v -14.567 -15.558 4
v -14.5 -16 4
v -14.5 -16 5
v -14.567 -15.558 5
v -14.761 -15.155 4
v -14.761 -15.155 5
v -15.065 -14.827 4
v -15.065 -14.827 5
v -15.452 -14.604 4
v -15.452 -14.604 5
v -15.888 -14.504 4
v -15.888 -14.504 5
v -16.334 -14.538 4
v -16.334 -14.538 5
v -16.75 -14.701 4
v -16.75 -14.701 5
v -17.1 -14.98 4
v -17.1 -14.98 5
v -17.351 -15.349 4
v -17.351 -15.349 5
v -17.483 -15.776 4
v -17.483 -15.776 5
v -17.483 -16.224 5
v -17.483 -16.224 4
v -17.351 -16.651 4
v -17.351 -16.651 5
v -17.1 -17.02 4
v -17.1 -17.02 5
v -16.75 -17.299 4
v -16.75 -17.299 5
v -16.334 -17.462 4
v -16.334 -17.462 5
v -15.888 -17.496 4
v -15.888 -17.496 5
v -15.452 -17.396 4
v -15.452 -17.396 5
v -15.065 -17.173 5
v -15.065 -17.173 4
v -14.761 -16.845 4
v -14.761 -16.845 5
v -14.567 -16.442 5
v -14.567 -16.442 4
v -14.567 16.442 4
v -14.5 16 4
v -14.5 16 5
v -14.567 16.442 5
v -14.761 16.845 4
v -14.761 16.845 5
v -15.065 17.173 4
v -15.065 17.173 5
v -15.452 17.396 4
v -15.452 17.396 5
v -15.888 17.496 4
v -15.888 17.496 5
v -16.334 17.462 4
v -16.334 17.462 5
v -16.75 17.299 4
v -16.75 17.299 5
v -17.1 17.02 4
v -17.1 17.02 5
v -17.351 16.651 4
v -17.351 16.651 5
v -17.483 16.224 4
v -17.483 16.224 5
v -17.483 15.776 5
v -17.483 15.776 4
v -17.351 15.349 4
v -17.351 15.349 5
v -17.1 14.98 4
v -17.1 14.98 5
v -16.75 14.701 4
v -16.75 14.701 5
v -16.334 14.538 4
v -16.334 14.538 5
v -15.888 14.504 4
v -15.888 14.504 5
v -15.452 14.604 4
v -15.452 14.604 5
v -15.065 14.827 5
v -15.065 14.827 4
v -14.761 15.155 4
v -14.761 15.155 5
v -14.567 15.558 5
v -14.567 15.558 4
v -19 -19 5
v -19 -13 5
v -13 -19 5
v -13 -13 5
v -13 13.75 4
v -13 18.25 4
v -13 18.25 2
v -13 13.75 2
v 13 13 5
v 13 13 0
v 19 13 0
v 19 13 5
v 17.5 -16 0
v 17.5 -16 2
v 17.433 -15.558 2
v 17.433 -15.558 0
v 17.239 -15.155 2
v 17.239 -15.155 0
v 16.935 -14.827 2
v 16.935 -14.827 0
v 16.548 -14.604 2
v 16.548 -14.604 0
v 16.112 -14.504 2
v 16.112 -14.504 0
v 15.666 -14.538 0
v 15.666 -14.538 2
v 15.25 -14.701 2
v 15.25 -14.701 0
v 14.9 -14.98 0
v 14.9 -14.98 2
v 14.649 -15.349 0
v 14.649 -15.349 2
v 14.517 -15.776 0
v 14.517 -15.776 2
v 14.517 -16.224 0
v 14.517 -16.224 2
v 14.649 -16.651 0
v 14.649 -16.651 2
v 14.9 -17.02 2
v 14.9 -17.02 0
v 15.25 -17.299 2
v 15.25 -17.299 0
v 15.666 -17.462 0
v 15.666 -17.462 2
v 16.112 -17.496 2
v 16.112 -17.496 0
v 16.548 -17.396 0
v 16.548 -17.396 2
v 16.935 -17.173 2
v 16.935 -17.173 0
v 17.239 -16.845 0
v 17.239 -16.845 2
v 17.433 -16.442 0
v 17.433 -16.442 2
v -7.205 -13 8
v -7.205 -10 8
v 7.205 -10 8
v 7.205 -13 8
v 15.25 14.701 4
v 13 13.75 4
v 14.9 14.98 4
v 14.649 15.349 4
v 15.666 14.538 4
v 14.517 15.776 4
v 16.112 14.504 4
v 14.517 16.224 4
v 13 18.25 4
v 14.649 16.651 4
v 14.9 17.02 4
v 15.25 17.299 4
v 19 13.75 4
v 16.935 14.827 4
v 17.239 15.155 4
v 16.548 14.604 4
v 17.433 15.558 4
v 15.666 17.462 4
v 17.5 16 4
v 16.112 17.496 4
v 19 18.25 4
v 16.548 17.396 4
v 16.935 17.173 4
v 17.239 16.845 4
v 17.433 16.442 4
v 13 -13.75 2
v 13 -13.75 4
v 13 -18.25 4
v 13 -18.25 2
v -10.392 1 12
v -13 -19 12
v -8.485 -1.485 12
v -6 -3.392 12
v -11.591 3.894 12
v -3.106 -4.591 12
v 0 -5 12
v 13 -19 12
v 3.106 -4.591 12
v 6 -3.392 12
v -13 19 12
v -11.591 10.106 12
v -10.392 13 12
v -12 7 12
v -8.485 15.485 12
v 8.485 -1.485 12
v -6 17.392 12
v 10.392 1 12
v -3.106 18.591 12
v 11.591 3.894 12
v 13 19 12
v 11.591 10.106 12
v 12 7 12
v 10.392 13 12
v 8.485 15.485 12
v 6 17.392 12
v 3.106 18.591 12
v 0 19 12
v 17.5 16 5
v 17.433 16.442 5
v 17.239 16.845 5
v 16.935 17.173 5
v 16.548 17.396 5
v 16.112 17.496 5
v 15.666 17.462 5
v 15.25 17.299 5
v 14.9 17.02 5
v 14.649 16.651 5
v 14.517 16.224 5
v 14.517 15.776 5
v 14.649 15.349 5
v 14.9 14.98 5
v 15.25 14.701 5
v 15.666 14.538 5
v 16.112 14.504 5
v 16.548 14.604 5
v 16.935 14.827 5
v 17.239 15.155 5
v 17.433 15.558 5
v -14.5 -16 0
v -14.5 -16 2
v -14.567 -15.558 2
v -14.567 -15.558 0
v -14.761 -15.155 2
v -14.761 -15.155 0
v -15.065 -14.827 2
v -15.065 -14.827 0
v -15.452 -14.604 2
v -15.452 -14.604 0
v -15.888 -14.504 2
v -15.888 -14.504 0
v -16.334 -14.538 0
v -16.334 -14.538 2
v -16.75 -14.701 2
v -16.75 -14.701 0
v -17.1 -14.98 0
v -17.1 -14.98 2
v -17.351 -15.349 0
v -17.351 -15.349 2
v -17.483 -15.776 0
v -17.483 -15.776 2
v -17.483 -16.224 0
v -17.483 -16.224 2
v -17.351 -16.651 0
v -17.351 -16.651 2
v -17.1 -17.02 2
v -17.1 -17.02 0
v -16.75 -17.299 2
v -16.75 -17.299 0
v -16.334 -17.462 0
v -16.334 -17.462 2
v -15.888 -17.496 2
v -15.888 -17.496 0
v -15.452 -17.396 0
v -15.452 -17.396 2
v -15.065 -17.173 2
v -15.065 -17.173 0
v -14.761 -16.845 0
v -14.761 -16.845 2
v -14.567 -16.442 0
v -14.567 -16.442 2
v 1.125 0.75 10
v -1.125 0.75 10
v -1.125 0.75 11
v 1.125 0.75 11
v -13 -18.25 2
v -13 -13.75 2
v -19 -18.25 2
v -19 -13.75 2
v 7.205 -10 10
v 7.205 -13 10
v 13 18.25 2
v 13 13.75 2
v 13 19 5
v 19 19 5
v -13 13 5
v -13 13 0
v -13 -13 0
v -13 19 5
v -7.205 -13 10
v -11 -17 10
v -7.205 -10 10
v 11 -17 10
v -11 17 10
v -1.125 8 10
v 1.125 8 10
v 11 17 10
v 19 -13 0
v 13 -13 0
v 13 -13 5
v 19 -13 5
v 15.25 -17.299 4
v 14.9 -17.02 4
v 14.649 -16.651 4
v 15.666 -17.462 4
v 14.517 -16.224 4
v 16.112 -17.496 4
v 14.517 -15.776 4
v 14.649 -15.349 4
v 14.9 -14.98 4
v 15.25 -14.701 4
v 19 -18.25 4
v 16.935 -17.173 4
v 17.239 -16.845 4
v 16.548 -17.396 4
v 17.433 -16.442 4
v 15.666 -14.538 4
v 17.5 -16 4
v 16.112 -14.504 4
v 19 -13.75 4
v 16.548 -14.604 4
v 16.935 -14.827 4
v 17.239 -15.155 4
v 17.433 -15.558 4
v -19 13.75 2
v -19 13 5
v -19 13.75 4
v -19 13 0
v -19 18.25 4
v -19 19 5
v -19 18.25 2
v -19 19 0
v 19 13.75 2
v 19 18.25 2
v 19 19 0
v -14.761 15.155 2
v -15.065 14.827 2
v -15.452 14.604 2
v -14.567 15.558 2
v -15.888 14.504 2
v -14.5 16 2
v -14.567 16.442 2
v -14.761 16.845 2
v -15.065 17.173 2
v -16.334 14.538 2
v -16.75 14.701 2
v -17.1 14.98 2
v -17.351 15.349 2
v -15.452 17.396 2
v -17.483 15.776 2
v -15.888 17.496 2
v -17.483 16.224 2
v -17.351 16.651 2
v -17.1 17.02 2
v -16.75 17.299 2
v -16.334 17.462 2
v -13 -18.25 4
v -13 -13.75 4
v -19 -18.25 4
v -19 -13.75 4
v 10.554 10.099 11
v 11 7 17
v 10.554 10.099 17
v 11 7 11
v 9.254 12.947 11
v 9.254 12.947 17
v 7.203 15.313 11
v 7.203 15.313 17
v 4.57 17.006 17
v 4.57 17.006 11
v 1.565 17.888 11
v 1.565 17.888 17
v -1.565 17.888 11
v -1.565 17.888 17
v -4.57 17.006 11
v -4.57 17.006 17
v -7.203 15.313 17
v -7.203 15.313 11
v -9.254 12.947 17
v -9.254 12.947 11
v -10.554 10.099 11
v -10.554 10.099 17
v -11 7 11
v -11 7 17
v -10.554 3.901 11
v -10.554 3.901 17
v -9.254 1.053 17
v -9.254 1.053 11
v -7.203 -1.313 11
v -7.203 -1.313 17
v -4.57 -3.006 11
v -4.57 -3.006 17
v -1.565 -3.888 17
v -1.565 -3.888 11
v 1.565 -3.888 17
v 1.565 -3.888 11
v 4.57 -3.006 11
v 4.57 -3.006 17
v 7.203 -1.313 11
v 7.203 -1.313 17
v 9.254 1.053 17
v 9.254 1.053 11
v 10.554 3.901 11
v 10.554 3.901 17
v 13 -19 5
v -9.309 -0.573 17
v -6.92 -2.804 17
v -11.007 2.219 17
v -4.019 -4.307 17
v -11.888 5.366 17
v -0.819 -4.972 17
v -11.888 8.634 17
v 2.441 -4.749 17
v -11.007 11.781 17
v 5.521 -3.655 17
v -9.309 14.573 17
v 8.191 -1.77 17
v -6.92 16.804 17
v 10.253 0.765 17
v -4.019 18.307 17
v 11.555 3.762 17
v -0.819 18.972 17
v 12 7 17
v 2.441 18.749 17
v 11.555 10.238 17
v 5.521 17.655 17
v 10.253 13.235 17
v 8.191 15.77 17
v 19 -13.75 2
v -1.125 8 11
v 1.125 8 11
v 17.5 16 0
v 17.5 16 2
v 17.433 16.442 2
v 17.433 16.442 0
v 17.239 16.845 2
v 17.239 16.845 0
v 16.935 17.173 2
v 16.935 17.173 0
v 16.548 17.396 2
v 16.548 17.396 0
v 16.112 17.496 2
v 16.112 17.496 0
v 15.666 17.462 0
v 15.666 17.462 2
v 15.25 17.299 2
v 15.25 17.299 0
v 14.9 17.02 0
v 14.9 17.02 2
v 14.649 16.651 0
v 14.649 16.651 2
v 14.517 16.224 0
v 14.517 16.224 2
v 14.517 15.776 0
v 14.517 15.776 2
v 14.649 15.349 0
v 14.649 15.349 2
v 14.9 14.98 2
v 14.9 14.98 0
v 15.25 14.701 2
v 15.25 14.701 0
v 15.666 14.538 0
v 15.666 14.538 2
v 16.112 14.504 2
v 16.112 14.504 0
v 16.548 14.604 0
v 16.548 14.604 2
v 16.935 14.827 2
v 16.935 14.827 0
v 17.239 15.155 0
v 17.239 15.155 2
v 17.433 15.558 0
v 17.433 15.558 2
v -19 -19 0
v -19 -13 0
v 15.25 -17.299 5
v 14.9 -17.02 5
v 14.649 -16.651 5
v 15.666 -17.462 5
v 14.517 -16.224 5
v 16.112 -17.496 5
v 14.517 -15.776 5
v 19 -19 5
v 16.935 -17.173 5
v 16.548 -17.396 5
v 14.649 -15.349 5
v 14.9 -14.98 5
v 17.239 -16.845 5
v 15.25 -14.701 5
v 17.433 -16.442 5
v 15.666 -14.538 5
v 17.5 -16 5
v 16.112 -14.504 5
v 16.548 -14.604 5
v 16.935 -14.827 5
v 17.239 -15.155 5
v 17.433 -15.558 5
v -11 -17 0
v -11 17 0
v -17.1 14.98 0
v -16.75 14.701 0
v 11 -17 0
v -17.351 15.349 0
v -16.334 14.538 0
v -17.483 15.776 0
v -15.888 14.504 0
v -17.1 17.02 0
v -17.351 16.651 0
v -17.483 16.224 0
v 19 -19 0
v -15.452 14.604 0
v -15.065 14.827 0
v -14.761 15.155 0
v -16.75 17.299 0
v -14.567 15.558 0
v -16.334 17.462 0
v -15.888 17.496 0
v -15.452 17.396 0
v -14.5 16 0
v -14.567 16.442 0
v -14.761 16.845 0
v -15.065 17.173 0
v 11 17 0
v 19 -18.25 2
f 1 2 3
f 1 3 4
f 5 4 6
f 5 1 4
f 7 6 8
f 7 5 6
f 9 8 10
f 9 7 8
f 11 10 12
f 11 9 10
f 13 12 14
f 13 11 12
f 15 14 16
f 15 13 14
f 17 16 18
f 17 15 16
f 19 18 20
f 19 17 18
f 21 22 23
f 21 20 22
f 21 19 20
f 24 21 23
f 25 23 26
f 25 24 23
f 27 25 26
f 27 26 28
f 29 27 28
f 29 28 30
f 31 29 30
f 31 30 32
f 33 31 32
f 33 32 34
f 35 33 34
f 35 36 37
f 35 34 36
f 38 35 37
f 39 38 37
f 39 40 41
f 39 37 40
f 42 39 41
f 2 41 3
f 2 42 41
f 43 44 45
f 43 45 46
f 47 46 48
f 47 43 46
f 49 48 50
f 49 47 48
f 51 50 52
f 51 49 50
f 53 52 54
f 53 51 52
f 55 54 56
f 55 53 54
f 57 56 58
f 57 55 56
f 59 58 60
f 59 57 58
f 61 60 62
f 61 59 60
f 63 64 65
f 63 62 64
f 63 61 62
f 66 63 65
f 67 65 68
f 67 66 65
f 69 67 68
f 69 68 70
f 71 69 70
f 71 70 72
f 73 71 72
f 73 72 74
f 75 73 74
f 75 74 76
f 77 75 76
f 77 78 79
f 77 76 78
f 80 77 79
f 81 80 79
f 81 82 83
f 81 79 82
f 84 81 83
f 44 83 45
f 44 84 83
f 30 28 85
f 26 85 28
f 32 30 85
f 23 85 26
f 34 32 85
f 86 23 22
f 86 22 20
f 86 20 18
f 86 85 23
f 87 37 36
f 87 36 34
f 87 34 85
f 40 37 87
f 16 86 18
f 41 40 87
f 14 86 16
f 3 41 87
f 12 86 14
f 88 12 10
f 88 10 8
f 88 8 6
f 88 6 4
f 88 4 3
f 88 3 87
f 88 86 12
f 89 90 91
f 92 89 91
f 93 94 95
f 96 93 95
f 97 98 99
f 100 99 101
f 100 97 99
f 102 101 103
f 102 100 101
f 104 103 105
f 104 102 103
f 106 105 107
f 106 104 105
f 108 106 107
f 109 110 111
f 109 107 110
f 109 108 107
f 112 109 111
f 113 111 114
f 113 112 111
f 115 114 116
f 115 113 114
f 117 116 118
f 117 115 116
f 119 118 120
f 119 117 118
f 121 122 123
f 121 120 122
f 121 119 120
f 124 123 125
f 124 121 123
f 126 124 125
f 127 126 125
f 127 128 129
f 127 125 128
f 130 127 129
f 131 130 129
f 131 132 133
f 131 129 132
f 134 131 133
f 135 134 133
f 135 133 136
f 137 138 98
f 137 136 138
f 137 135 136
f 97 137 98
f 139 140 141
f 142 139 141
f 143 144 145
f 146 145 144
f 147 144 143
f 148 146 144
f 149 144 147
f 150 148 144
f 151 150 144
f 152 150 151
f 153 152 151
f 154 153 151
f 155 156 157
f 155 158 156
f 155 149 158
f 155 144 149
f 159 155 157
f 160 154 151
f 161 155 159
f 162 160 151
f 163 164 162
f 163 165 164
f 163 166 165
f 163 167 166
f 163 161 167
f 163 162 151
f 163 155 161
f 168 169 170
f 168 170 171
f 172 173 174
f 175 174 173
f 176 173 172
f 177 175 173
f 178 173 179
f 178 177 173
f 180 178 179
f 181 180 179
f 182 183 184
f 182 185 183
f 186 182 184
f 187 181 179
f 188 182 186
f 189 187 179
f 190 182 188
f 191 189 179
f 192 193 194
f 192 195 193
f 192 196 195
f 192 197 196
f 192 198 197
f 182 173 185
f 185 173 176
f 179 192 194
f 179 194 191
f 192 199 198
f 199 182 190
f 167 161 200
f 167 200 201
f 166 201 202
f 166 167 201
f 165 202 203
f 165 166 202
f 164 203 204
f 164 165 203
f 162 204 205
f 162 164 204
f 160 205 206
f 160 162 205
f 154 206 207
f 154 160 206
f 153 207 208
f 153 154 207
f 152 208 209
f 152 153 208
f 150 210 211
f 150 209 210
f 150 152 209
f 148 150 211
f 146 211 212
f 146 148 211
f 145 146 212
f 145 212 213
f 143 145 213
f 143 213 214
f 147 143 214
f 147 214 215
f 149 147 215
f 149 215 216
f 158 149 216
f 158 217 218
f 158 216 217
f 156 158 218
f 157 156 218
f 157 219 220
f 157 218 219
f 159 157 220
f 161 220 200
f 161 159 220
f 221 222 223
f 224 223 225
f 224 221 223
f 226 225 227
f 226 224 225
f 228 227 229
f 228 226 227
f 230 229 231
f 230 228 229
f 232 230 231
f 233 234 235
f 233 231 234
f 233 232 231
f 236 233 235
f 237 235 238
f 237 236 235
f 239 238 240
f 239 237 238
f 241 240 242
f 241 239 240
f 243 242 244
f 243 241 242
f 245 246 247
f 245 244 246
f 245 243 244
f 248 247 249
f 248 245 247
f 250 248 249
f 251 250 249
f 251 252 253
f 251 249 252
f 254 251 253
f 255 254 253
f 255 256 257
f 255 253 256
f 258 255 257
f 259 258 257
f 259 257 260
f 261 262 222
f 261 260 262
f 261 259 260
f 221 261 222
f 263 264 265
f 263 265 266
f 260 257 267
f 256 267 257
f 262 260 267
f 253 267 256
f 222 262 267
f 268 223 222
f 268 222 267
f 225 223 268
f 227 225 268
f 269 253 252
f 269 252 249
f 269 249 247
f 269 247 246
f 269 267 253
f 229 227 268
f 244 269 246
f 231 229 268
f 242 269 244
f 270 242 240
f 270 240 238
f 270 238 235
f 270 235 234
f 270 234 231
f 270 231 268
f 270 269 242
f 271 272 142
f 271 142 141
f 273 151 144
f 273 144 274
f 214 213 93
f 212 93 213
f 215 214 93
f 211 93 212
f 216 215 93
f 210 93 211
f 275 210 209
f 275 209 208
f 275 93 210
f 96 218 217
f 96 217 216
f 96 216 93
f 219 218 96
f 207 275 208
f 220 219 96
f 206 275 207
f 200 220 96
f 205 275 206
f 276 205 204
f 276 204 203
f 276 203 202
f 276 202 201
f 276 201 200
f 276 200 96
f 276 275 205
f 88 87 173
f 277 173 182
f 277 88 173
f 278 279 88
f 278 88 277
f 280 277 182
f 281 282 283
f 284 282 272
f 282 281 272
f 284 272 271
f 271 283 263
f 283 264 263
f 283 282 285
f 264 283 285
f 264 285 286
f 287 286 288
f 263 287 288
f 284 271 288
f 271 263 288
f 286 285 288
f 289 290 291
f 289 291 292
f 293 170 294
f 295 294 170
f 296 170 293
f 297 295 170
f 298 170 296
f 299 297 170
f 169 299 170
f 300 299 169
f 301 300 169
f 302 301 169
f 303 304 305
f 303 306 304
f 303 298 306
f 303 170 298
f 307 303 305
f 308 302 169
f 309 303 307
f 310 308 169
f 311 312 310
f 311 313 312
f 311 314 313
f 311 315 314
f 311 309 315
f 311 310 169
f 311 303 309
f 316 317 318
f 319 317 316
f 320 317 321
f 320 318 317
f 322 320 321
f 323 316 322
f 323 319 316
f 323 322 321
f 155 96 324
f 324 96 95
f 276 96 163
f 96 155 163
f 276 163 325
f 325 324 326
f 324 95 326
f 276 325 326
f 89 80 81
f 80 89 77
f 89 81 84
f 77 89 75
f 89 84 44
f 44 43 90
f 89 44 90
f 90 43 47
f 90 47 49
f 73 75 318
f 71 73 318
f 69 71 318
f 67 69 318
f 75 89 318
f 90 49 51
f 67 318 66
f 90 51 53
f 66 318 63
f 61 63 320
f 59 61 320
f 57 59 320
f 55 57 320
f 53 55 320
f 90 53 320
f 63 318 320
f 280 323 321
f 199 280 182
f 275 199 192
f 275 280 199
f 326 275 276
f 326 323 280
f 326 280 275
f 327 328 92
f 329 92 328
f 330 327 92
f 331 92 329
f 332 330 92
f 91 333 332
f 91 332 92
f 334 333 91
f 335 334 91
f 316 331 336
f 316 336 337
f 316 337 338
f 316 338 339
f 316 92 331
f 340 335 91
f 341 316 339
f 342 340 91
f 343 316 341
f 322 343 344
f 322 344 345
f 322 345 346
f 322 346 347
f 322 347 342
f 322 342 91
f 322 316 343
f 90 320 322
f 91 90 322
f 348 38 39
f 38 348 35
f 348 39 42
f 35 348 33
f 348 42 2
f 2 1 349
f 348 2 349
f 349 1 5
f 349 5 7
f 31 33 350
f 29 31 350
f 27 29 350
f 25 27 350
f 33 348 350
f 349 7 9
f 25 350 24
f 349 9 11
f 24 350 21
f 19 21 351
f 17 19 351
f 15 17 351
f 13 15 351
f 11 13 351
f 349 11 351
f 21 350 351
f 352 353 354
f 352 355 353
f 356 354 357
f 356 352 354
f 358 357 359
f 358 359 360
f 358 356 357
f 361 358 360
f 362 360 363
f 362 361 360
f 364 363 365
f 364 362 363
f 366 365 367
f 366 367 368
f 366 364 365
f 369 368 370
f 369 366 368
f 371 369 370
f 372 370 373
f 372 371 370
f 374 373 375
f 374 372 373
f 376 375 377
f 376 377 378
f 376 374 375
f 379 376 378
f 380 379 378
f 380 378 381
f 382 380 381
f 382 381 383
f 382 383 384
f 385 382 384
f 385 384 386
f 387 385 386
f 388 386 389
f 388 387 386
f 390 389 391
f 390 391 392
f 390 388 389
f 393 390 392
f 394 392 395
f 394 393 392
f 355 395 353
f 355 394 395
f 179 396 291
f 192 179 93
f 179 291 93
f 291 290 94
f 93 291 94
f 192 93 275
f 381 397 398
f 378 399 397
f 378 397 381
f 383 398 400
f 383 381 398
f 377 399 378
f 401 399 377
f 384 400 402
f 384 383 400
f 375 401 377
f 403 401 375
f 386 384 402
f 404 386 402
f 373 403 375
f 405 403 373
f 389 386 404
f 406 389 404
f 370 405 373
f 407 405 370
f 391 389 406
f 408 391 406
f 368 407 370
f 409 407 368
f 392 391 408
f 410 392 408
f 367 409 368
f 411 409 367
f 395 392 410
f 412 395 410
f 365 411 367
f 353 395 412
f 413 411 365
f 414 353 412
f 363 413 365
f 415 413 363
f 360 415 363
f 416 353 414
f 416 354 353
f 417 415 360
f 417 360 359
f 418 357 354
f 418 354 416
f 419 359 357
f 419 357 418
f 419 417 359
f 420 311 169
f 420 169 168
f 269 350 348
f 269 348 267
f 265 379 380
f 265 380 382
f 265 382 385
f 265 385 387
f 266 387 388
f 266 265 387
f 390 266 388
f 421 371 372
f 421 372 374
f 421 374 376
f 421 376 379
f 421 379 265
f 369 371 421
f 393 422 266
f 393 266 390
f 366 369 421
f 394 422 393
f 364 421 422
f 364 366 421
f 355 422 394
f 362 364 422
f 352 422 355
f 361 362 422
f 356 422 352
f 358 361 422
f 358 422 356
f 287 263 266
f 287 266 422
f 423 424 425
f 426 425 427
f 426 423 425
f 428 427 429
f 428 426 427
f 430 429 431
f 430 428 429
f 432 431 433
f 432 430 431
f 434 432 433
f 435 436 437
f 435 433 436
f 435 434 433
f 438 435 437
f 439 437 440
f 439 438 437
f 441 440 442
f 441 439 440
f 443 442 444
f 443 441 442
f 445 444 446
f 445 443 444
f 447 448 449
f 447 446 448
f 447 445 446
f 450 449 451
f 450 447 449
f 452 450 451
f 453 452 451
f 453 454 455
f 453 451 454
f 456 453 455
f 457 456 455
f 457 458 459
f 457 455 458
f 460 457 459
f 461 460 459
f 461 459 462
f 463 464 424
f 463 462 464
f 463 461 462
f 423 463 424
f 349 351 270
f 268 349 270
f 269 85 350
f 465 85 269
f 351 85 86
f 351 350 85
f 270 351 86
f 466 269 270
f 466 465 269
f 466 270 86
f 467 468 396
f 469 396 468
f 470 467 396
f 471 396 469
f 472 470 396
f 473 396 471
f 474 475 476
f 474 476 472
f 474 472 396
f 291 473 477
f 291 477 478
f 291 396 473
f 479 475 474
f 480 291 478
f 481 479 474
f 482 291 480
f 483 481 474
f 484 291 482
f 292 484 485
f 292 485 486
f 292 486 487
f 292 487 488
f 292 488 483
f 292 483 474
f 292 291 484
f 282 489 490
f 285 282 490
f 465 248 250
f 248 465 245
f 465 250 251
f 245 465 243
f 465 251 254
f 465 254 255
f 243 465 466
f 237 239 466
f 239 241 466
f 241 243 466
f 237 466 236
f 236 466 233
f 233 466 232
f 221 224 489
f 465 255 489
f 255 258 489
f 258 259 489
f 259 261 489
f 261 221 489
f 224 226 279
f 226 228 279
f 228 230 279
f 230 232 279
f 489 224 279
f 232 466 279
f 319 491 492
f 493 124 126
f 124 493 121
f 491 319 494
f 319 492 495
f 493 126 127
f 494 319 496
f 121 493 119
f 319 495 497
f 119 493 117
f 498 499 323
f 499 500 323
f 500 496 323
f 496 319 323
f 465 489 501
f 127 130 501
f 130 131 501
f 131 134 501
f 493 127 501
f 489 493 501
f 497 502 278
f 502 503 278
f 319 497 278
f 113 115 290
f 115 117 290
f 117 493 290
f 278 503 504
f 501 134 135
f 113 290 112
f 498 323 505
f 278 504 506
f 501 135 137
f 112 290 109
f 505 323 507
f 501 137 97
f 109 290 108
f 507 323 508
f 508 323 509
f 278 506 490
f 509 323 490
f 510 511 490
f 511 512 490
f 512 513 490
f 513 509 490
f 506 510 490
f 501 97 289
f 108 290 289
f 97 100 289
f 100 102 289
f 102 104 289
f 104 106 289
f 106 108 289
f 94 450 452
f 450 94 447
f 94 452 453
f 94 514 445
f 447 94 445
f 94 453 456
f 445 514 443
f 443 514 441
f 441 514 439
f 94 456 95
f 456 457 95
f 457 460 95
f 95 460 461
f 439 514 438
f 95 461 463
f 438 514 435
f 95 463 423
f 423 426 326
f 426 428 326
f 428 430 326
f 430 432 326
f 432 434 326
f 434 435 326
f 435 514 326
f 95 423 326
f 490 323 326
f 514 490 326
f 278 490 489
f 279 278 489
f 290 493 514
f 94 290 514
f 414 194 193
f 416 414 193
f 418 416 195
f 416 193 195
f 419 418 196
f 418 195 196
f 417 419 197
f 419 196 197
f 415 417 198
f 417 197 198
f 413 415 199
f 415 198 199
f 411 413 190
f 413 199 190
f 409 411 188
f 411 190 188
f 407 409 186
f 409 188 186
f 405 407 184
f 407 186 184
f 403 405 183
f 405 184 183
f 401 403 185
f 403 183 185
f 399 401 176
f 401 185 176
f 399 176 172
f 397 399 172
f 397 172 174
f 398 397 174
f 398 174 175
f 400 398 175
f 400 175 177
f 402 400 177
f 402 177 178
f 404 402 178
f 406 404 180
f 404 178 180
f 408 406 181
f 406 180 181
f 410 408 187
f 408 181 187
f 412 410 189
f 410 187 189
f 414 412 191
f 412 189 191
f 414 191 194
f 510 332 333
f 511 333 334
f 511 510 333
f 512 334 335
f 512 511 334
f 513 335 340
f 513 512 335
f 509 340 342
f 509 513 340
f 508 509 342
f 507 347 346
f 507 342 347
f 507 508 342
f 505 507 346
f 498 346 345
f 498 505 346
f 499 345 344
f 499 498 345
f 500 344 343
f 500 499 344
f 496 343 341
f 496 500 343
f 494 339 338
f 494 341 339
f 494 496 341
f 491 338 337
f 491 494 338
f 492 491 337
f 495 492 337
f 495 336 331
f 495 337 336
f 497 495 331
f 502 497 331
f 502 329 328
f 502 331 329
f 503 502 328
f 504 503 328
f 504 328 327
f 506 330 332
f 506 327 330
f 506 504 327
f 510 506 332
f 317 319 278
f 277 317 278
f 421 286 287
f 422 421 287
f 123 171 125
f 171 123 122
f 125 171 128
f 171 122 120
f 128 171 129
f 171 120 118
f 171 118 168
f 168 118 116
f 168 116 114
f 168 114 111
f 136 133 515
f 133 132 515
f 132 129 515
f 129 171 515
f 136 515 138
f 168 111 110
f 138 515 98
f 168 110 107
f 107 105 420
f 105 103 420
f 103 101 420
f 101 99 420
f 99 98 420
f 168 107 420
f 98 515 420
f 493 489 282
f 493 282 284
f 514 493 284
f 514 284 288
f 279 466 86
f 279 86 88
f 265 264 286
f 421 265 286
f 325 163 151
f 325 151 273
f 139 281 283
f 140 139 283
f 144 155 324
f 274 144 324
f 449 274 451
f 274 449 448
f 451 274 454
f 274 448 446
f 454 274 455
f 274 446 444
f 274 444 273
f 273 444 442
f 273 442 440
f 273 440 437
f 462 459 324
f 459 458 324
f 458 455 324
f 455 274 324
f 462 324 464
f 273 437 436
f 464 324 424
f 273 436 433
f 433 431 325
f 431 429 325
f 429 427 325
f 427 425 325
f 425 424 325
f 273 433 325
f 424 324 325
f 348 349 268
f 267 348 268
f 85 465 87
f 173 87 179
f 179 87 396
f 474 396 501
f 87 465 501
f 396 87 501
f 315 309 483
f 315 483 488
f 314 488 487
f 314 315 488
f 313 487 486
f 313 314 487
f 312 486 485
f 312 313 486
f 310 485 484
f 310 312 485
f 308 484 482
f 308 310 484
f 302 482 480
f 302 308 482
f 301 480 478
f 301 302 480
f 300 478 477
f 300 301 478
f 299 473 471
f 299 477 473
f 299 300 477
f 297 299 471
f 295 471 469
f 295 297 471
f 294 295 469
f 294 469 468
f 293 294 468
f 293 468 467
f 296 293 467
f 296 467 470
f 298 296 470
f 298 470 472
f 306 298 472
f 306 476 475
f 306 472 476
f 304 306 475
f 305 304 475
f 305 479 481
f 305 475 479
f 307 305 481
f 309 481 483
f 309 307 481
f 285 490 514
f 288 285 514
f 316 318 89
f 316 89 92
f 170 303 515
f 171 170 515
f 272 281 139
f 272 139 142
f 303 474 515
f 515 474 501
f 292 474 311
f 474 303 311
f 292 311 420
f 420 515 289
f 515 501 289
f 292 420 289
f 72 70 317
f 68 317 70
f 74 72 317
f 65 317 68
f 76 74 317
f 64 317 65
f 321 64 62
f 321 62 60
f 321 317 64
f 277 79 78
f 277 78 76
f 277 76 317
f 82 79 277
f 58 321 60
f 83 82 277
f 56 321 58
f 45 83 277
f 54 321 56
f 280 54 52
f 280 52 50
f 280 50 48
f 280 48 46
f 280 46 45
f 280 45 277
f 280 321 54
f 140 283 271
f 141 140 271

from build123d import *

# Parameters (mm, degrees)
SKETCH_1_W          = 26
SKETCH_1_H          = 38
EXTRUDE_1_DEPTH     = 12
SKETCH_2_W          = 22
SKETCH_2_H          = 34
CUT_EXTRUDE_1_DEPTH = 10
SKETCH_3_W          = 2.25
SKETCH_3_H          = 7.25
CUT_EXTRUDE_3_DEPTH = 12
SKETCH_4_W          = 6
SKETCH_4_H          = 6
EXTRUDE_2_DEPTH     = 5
SKETCH_5_R          = 1.5
CUT_EXTRUDE_4_DEPTH = 13
CUT_EXTRUDE_START   = 2
CUT_EXTRUDE_5_DEPTH = 1.6
SKETCH_7_R          = 12
SKETCH_7_R_2        = 11
EXTRUDE_3_DEPTH     = 5
SKETCH_9_R          = 11
CUT_EXTRUDE_7_DEPTH = 1
SKETCH_10_W         = 14.41096837
SKETCH_10_H         = 3
EXTRUDE_4_DEPTH     = 2
CUT_EXTRUDE_START_2 = 20
SKETCH_11_W         = 2
SKETCH_11_H         = 4.5
CUT_EXTRUDE_8_DEPTH = 7
CUT_EXTRUDE_START_3 = -20
SKETCH_13_W         = 2
SKETCH_13_H         = 4.5
CUT_EXTRUDE_9_DEPTH = 7


with BuildPart() as part:
    # ｽｹｯﾁ1 → ﾎﾞｽ - 押し出し1 (new body)
    with BuildSketch(Plane.XY):
        Rectangle(SKETCH_1_W, SKETCH_1_H)
    extrude(amount=EXTRUDE_1_DEPTH)

    # ｽｹｯﾁ2 → ｶｯﾄ - 押し出し1 (cut)
    with BuildSketch(Plane.XY):
        Rectangle(SKETCH_2_W, SKETCH_2_H)
    extrude(amount=CUT_EXTRUDE_1_DEPTH, mode=Mode.SUBTRACT)

    # ｽｹｯﾁ3 → ｶｯﾄ - 押し出し3 (cut)
    with BuildSketch(Plane.XY):
        with Locations((0, 4.375)):
            Rectangle(SKETCH_3_W, SKETCH_3_H)
    extrude(amount=CUT_EXTRUDE_3_DEPTH, mode=Mode.SUBTRACT)

    # ｽｹｯﾁ4 → ﾎﾞｽ - 押し出し2 (add)
    with BuildSketch(Plane.XY):
        with Locations((16, 16)):
            Rectangle(SKETCH_4_W, SKETCH_4_H)
        with Locations((16, -16)):
            Rectangle(SKETCH_4_W, SKETCH_4_H)
        with Locations((-16, -16)):
            Rectangle(SKETCH_4_W, SKETCH_4_H)
        with Locations((-16, 16)):
            Rectangle(SKETCH_4_W, SKETCH_4_H)
    extrude(amount=EXTRUDE_2_DEPTH)

    # ｽｹｯﾁ5 → ｶｯﾄ - 押し出し4 (cut, through all)
    with BuildSketch(Plane.XY):
        with Locations((-16, 16)):
            Circle(SKETCH_5_R)
        with Locations((-16, -16)):
            Circle(SKETCH_5_R)
        with Locations((16, -16)):
            Circle(SKETCH_5_R)
        with Locations((16, 16)):
            Circle(SKETCH_5_R)
    extrude(amount=CUT_EXTRUDE_4_DEPTH, mode=Mode.SUBTRACT)

    # ｽｹｯﾁ6 → ｶｯﾄ - 押し出し5 (cut)
    with BuildSketch(Plane.XY.offset(CUT_EXTRUDE_START)):
        Polygon((-17.184124892, 17.98272075), (-18.309148984, 15.965878137), (-17.125024092, 13.983157387), (-14.815875108, 14.01727925), (-13.690851016, 16.034121863), (-14.874975908, 18.016842613), align=None)
        Polygon((-17.154700538, -14), (-18.309401077, -16), (-17.154700538, -18), (-14.845299462, -18), (-13.690598923, -16), (-14.845299462, -14), align=None)
        Polygon((14.845299462, 18), (13.690598923, 16), (14.845299462, 14), (17.154700538, 14), (18.309401077, 16), (17.154700538, 18), align=None)
        Polygon((14.854466591, -13.994735294), (13.690623119, -15.98942868), (14.836156527, -17.994693386), (17.145533409, -18.005264706), (18.309376881, -16.01057132), (17.163843473, -14.005306614), align=None)
    extrude(amount=CUT_EXTRUDE_5_DEPTH, mode=Mode.SUBTRACT)

    # ｽｹｯﾁ7 → ﾎﾞｽ - 押し出し3 (add)
    with BuildSketch(Plane.XY.offset(12)):
        with Locations((0, 7)):
            Circle(SKETCH_7_R)
        with Locations((0, 7)):
            Circle(SKETCH_7_R_2, mode=Mode.SUBTRACT)
    extrude(amount=EXTRUDE_3_DEPTH)

    # ｽｹｯﾁ9 → ｶｯﾄ - 押し出し7 (cut)
    with BuildSketch(Plane.XY.offset(12)):
        with Locations((0, 7)):
            Circle(SKETCH_9_R)
    extrude(amount=-CUT_EXTRUDE_7_DEPTH, mode=Mode.SUBTRACT)

    # ｽｹｯﾁ10 → ﾎﾞｽ - 押し出し4 (add)
    with BuildSketch(Plane.XY.offset(10)):
        with Locations((0, -11.5)):
            Rectangle(SKETCH_10_W, SKETCH_10_H)
    extrude(amount=-EXTRUDE_4_DEPTH)

    # ｽｹｯﾁ11 → ｶｯﾄ - 押し出し8 (cut)
    with BuildSketch(Plane(origin=(0, 0, 0), x_dir=(0, 0, -1), z_dir=(1, 0, 0)).offset(CUT_EXTRUDE_START_2)):
        with Locations((-3, 16)):
            Rectangle(SKETCH_11_W, SKETCH_11_H)
        with Locations((-3, -16)):
            Rectangle(SKETCH_11_W, SKETCH_11_H)
    extrude(amount=-CUT_EXTRUDE_8_DEPTH, mode=Mode.SUBTRACT)

    # ｽｹｯﾁ13 → ｶｯﾄ - 押し出し9 (cut)
    with BuildSketch(Plane(origin=(0, 0, 0), x_dir=(0, 0, -1), z_dir=(1, 0, 0)).offset(CUT_EXTRUDE_START_3)):
        with Locations((-3, 16)):
            Rectangle(SKETCH_13_W, SKETCH_13_H)
        with Locations((-3, -16)):
            Rectangle(SKETCH_13_W, SKETCH_13_H)
    extrude(amount=CUT_EXTRUDE_9_DEPTH, mode=Mode.SUBTRACT)


solid = part.part
